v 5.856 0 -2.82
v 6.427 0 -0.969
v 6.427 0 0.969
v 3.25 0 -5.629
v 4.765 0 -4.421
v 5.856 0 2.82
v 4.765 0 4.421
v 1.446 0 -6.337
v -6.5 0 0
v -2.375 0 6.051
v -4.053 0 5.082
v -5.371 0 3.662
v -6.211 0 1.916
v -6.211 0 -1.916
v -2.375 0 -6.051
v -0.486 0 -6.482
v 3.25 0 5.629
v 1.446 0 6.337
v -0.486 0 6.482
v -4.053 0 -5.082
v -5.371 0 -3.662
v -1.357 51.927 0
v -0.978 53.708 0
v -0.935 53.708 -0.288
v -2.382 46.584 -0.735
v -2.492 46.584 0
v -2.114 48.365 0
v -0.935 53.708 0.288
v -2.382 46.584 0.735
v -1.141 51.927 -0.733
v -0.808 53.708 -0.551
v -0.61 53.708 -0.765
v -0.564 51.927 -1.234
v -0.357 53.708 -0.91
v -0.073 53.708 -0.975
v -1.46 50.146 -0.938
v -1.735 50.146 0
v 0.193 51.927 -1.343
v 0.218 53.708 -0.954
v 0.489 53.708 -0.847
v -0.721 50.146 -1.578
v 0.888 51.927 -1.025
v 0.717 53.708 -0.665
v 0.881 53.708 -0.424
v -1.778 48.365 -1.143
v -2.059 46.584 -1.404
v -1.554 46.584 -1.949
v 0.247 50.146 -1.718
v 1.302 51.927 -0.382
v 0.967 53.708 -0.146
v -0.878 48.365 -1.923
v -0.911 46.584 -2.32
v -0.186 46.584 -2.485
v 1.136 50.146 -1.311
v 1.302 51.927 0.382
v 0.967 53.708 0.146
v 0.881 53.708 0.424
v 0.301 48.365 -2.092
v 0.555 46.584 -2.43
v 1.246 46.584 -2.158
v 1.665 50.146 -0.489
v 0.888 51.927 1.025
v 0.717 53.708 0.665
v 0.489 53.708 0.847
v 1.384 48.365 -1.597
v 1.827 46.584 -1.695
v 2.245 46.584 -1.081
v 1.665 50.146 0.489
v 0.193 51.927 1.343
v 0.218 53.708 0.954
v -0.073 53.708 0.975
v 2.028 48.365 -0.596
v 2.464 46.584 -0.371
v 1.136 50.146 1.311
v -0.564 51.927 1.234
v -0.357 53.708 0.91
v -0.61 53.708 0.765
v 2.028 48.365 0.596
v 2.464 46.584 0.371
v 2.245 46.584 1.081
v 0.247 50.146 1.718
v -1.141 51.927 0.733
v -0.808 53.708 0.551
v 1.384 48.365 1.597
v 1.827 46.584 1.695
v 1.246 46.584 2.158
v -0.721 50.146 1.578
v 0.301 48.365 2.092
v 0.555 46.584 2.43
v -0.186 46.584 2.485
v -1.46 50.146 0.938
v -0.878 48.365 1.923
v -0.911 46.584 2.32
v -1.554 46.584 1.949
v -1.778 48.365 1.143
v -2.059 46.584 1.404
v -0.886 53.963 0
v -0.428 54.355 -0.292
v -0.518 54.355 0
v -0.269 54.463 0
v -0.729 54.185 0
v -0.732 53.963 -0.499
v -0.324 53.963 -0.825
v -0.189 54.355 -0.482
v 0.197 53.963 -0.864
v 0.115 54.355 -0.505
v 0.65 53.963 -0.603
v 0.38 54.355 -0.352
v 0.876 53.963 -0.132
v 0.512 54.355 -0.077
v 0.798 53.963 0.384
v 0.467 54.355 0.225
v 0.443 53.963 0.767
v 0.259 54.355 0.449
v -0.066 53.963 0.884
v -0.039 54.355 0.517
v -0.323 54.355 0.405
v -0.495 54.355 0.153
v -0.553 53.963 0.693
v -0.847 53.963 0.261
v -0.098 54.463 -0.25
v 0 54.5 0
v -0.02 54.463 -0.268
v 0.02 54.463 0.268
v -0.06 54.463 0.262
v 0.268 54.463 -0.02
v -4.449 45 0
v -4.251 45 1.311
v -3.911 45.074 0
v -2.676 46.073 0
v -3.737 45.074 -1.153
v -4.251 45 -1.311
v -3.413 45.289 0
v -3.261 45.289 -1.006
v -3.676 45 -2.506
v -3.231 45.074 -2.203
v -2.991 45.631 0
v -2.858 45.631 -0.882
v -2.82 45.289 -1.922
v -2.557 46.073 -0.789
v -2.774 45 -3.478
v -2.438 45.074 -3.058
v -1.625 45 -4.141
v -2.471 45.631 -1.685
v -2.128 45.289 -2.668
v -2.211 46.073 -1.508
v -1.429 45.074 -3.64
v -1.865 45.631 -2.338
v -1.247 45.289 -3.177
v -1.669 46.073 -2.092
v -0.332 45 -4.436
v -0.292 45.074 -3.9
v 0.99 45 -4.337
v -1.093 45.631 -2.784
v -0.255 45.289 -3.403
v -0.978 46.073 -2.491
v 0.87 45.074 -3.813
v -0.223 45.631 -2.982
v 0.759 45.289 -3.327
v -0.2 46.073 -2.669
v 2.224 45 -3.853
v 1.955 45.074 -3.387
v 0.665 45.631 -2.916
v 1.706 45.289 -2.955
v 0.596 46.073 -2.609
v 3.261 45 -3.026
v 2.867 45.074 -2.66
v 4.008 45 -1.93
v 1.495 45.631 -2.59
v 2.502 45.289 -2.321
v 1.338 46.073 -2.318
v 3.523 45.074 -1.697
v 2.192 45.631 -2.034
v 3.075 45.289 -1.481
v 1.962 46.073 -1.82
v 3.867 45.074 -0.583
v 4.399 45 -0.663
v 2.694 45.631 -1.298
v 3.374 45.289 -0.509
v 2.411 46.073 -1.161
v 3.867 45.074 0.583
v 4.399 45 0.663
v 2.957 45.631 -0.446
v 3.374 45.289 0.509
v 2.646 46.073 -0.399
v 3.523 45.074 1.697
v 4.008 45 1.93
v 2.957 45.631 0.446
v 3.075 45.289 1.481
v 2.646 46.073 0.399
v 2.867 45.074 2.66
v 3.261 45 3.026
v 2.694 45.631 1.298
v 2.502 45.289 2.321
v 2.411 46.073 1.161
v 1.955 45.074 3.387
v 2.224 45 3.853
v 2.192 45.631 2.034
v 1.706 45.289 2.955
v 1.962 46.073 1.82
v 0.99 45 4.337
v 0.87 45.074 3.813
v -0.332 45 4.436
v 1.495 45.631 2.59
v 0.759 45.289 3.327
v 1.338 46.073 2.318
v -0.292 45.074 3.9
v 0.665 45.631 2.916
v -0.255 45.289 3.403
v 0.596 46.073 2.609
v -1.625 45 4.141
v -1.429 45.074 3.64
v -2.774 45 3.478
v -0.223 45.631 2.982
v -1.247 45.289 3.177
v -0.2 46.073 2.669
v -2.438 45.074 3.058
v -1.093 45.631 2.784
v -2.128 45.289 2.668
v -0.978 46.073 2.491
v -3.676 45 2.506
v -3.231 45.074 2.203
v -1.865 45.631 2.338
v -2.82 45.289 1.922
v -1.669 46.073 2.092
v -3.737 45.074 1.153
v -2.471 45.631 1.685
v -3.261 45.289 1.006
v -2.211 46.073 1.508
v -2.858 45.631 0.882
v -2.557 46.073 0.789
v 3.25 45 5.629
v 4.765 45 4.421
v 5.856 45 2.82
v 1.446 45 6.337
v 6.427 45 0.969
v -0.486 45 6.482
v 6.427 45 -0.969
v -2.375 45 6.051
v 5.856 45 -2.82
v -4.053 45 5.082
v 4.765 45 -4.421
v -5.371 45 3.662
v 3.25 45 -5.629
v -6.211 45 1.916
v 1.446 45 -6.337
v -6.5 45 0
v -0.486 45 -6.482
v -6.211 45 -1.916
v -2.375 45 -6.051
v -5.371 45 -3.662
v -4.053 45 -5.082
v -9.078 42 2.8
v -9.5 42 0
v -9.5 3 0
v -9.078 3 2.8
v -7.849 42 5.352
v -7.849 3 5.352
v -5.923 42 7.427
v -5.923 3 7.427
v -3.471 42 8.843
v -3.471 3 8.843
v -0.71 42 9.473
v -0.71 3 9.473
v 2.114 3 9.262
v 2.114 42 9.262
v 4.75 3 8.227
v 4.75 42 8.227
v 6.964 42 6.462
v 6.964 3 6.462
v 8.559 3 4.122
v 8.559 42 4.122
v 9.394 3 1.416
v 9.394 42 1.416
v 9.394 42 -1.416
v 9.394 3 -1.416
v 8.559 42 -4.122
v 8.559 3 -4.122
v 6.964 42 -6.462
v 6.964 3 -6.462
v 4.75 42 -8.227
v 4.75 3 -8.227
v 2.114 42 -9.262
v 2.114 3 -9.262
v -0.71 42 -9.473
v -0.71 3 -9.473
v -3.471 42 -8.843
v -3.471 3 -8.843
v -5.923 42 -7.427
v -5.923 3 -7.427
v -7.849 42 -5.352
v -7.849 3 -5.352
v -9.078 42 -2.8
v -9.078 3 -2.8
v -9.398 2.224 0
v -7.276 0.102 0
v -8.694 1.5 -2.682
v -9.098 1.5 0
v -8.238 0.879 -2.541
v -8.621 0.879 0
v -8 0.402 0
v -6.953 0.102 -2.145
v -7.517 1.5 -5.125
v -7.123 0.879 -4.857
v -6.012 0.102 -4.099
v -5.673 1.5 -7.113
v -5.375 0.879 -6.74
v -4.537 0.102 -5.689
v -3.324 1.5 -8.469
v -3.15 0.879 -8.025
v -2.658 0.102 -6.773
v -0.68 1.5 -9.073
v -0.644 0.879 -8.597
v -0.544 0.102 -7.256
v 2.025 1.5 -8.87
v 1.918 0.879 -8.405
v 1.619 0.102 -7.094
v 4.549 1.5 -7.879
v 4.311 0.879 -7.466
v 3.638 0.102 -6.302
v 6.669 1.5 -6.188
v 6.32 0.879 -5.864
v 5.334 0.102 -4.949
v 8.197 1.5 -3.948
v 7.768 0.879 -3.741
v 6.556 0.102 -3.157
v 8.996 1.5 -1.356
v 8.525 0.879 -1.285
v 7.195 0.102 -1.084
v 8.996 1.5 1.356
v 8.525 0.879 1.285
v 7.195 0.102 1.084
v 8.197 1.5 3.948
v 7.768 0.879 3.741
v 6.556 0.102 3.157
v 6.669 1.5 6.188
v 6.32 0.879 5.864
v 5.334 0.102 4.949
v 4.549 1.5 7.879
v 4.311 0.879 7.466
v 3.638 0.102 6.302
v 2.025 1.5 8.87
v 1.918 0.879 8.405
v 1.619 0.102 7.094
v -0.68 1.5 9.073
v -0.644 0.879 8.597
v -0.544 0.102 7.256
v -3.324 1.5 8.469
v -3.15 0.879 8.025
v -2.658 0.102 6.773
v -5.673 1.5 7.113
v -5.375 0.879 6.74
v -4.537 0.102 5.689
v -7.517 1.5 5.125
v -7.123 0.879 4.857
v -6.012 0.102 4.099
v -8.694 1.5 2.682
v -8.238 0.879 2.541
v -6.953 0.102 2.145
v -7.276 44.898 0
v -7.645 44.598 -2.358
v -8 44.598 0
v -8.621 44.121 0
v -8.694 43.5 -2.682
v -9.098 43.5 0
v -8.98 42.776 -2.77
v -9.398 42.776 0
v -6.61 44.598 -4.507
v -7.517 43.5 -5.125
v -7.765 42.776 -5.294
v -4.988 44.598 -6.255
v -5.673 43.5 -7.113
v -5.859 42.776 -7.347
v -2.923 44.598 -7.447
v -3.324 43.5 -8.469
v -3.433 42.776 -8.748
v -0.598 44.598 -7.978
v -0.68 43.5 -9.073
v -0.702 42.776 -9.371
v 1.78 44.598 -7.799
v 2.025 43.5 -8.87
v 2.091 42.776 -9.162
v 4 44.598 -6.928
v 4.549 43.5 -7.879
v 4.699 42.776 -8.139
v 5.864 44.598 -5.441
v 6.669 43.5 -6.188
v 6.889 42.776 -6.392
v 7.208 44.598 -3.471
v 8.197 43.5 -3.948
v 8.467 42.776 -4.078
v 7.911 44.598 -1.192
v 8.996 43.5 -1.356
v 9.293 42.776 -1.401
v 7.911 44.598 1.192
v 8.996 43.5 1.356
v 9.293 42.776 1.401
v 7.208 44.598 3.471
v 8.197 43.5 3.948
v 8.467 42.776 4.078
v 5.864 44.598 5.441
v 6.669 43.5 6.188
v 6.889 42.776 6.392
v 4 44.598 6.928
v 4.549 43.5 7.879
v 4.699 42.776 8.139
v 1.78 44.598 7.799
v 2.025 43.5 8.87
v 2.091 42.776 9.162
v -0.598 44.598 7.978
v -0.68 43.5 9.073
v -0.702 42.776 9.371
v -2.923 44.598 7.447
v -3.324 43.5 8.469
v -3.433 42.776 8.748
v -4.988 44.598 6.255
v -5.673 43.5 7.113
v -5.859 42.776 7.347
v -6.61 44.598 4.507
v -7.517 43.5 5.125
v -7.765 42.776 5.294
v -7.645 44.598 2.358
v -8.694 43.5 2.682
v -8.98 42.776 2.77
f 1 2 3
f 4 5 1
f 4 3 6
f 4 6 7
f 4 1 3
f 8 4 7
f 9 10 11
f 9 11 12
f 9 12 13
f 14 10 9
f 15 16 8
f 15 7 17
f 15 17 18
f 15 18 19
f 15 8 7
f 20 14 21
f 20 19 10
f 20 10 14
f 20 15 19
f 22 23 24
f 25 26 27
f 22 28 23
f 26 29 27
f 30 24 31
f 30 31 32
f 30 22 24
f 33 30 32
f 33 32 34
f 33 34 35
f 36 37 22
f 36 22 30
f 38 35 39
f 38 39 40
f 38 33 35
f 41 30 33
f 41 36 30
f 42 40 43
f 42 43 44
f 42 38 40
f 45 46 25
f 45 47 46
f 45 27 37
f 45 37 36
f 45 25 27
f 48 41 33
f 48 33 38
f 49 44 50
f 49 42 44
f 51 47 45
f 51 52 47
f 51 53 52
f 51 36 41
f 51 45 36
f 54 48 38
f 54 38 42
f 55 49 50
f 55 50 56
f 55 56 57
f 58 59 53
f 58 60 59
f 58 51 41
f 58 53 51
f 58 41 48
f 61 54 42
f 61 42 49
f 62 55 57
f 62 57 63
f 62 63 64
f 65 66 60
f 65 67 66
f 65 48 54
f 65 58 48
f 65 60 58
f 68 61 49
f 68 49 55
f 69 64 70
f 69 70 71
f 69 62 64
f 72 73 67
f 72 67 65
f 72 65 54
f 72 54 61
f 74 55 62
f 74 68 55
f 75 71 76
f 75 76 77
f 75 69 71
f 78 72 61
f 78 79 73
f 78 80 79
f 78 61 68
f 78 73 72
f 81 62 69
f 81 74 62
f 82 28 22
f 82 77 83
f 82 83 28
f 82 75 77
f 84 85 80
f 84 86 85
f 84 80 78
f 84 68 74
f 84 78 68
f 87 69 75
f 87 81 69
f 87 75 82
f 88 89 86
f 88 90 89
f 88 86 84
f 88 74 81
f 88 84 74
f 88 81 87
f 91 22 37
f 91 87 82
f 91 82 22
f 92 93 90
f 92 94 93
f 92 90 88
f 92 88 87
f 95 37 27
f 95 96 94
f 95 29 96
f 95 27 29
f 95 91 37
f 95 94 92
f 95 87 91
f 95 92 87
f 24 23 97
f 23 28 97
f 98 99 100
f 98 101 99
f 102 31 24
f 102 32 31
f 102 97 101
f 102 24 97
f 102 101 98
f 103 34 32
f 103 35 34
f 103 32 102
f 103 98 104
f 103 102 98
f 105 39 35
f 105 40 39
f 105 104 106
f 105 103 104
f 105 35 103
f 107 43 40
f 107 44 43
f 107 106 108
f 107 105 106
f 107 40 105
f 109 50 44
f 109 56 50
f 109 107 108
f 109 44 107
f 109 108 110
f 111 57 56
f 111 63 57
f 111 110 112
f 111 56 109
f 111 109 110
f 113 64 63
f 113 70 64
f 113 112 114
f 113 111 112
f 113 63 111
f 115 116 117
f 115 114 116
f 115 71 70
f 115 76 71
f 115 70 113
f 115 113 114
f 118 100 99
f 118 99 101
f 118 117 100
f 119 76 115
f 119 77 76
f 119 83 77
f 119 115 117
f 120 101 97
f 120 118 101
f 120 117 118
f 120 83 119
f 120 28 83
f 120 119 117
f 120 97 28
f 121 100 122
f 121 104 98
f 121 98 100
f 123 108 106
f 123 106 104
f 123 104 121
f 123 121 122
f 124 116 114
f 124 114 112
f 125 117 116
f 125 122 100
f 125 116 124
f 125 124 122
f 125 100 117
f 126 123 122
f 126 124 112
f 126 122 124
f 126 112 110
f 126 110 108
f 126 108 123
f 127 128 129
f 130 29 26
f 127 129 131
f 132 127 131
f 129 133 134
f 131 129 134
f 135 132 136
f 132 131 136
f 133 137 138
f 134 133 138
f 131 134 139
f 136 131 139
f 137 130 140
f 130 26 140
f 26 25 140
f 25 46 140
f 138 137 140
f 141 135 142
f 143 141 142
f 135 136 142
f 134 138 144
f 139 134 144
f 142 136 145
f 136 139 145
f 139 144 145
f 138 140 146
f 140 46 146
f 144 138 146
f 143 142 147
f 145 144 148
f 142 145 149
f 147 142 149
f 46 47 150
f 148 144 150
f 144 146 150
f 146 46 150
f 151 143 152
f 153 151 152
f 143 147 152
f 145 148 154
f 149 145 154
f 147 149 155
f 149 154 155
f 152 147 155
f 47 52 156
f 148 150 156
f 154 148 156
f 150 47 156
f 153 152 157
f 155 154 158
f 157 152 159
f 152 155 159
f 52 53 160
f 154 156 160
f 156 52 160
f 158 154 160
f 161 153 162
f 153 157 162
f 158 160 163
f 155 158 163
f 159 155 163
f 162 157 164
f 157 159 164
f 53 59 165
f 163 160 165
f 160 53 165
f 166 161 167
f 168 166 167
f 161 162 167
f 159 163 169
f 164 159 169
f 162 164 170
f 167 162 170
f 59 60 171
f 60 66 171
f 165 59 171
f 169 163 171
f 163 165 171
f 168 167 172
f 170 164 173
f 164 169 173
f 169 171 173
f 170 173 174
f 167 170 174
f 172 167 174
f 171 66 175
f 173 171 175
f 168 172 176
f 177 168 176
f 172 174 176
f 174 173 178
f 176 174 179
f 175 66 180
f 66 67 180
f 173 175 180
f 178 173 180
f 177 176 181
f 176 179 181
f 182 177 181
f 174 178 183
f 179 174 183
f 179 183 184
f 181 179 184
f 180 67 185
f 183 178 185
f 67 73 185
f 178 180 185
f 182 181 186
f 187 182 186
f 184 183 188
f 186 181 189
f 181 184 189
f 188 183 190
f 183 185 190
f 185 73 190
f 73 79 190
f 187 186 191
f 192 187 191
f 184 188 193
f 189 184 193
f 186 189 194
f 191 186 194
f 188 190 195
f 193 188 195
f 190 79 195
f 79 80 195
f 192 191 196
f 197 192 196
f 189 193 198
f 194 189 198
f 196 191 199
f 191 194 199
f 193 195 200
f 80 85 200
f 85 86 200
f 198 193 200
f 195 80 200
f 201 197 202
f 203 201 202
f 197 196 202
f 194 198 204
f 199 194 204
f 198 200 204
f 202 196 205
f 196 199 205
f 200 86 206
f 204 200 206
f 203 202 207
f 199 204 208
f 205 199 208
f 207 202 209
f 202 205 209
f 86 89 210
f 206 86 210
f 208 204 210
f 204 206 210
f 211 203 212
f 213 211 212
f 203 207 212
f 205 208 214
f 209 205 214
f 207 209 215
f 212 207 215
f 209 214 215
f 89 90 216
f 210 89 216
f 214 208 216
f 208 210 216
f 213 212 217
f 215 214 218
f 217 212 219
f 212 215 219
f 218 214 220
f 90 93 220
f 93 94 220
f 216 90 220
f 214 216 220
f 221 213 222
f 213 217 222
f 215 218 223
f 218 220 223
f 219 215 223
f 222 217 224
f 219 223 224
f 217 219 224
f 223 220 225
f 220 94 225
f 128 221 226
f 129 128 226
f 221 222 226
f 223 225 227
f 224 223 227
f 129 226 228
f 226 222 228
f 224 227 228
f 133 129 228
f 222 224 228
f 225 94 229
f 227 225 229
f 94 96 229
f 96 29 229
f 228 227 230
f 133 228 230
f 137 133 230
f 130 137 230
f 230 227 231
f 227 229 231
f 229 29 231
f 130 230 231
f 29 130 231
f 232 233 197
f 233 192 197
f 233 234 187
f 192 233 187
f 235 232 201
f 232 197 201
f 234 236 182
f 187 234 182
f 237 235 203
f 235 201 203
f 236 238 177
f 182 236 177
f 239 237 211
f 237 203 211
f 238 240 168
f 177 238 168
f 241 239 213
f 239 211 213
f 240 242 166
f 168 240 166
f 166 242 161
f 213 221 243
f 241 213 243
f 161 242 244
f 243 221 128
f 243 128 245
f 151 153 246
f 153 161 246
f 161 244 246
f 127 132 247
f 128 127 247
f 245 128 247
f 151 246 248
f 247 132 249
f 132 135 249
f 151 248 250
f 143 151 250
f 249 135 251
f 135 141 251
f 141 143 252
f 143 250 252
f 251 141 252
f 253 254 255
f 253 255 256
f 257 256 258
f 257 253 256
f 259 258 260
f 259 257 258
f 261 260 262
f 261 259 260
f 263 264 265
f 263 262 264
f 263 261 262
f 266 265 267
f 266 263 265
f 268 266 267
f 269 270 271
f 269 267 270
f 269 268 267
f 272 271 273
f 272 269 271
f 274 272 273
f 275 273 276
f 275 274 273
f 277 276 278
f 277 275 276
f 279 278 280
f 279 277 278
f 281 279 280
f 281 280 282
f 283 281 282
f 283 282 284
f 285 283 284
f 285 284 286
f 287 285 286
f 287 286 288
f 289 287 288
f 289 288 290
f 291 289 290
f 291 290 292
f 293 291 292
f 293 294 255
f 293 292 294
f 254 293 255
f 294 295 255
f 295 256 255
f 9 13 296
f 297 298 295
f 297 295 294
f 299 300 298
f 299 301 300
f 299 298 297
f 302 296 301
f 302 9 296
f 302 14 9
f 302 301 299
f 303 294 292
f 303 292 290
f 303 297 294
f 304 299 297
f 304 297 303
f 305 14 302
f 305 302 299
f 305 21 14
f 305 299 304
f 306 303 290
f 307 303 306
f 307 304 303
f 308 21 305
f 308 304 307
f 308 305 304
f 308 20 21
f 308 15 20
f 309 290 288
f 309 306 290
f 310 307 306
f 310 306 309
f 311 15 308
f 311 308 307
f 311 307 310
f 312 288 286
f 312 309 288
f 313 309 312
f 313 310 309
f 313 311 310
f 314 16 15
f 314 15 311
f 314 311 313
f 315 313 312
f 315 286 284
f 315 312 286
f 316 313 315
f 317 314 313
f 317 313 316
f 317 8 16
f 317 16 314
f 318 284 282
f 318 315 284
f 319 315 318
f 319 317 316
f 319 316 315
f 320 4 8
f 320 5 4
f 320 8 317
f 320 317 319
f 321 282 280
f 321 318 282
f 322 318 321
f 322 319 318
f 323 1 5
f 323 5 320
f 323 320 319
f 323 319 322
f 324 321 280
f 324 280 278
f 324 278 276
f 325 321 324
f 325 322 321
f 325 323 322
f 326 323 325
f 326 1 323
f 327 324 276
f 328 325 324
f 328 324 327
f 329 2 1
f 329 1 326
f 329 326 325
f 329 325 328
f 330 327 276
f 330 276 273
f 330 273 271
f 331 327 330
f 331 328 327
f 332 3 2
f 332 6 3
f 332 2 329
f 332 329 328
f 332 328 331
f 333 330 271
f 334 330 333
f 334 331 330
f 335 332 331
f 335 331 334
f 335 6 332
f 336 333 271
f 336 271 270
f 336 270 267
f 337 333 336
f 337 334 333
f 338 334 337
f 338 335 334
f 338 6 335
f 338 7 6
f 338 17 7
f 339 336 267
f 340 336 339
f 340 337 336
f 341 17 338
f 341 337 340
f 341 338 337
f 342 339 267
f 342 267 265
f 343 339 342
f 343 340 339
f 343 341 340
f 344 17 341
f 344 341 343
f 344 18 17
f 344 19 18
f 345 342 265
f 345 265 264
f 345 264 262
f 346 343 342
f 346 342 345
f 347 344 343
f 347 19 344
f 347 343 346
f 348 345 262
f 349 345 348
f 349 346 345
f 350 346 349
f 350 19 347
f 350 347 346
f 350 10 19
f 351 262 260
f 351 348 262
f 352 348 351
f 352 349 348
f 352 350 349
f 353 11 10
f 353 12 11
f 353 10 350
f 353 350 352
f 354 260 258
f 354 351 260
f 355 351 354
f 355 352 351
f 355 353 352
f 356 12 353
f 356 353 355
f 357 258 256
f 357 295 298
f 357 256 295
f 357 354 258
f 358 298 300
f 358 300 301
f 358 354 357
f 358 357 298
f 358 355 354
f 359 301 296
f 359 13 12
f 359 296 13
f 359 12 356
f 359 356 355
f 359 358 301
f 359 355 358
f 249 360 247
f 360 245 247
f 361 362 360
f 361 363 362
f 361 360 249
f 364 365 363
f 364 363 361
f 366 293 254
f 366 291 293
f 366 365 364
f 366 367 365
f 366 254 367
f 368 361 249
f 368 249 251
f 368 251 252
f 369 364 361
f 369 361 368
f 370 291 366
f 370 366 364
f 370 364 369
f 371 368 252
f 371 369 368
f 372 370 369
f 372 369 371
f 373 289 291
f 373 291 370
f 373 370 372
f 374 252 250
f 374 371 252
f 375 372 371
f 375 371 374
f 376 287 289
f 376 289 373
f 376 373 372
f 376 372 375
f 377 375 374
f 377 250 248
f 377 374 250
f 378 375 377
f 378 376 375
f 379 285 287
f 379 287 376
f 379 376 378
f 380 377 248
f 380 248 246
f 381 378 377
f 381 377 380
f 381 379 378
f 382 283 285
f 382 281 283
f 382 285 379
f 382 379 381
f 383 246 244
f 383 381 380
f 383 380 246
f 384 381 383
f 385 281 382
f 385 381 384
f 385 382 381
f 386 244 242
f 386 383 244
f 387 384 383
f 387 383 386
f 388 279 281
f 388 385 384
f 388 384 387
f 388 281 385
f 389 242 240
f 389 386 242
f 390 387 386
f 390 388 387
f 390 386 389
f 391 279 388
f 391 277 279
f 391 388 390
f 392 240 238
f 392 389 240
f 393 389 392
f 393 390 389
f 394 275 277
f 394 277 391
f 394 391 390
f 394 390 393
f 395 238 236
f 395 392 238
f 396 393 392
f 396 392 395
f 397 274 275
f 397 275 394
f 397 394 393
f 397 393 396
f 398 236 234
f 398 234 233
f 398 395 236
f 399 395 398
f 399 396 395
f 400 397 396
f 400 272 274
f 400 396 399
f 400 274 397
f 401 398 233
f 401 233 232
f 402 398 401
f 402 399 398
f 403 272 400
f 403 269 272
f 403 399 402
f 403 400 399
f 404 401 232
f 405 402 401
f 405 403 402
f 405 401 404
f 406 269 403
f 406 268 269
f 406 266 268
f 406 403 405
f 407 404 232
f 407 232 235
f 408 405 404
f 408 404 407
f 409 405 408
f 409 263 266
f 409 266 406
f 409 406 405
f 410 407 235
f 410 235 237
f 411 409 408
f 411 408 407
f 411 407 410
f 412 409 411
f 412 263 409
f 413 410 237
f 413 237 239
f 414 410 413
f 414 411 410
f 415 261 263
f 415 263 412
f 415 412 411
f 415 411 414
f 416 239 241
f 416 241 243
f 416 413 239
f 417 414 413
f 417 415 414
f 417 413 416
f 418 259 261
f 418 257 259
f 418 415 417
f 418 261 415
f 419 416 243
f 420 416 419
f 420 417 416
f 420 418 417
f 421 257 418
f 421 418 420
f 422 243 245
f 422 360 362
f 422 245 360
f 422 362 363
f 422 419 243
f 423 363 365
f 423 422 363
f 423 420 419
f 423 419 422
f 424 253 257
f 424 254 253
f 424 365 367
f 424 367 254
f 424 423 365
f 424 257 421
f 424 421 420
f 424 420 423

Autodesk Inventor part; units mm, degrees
ref_plane "YZ Plane" through (0, 0, 0) normal (1, 0, 0) x (0, 1, 0)
ref_plane "XZ Plane" through (0, 0, 0) normal (0, 1, 0) x (-1, 0, 0)
ref_plane "XY Plane" through (0, 0, 0) normal (0, 0, 1) x (1, 0, 0)
sketch "Sketch1" plane through (0, 0, 0) normal (0, 0, 1) x (1, 0, 0)
  line L0 (0, 0) -> (-6.5, 0)
  line L1 (-9.5, 3) -> (-9.5, 42)
  arc A0 (0, 54.5) -> (-0.9781, 53.7079) centre (0, 53.5) ccw
  line L2 (-0.9781, 53.7079) -> (-2.4923, 46.5842)
  line L3 (-6.5, 45) -> (-4.4486, 45)
  arc A1 (-4.4486, 45) -> (-2.4923, 46.5842) centre (-4.4486, 47) ccw
  arc A2 (-6.5, 45) -> (-9.5, 42) centre (-6.5, 42) ccw
  arc A3 (-9.5, 3) -> (-6.5, 0) centre (-6.5, 3) ccw
  line L4 (0, 63.3885) -> (0, -6.2417)
  point P0 (0, 0)
  dimension "d0" = 2
  dimension "d1" = 3
  dimension "d2" = 45
  dimension "d3" = 1
  dimension "d5" = 53.5
  dimension "d7" = 12
  dimension "d8" = 19
revolve "Revolution1" add sketch "Sketch1" angle 360 about axis through (0, 63.3885, 0) along (0, -1, 0)
properties part number "IN-14"
